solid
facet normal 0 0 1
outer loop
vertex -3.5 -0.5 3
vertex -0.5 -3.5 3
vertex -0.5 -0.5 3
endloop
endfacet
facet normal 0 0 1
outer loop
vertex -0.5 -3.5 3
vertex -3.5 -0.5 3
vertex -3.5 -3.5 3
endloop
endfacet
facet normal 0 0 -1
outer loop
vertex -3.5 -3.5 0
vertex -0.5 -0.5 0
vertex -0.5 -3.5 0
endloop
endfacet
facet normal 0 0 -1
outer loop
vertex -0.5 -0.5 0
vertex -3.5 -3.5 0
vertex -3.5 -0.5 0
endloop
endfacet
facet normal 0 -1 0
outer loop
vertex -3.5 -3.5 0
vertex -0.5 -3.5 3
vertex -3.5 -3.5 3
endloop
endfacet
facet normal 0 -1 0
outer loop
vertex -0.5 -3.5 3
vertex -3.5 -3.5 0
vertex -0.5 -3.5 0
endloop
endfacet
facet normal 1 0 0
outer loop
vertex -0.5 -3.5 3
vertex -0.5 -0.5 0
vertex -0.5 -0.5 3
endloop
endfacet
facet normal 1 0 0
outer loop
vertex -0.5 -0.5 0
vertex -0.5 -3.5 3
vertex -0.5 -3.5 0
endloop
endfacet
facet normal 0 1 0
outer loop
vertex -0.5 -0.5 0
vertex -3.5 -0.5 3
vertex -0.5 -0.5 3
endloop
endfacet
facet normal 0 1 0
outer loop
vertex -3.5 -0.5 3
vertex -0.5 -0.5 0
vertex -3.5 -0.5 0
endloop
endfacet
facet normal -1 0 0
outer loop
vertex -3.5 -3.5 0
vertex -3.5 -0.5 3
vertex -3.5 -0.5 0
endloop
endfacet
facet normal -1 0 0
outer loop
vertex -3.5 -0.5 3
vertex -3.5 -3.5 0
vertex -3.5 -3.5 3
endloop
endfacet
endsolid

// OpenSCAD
union() {
  translate([-3.5, -3.5, 0.0]) cube(size=[3.0,3.0,3.0], center=false);
}
